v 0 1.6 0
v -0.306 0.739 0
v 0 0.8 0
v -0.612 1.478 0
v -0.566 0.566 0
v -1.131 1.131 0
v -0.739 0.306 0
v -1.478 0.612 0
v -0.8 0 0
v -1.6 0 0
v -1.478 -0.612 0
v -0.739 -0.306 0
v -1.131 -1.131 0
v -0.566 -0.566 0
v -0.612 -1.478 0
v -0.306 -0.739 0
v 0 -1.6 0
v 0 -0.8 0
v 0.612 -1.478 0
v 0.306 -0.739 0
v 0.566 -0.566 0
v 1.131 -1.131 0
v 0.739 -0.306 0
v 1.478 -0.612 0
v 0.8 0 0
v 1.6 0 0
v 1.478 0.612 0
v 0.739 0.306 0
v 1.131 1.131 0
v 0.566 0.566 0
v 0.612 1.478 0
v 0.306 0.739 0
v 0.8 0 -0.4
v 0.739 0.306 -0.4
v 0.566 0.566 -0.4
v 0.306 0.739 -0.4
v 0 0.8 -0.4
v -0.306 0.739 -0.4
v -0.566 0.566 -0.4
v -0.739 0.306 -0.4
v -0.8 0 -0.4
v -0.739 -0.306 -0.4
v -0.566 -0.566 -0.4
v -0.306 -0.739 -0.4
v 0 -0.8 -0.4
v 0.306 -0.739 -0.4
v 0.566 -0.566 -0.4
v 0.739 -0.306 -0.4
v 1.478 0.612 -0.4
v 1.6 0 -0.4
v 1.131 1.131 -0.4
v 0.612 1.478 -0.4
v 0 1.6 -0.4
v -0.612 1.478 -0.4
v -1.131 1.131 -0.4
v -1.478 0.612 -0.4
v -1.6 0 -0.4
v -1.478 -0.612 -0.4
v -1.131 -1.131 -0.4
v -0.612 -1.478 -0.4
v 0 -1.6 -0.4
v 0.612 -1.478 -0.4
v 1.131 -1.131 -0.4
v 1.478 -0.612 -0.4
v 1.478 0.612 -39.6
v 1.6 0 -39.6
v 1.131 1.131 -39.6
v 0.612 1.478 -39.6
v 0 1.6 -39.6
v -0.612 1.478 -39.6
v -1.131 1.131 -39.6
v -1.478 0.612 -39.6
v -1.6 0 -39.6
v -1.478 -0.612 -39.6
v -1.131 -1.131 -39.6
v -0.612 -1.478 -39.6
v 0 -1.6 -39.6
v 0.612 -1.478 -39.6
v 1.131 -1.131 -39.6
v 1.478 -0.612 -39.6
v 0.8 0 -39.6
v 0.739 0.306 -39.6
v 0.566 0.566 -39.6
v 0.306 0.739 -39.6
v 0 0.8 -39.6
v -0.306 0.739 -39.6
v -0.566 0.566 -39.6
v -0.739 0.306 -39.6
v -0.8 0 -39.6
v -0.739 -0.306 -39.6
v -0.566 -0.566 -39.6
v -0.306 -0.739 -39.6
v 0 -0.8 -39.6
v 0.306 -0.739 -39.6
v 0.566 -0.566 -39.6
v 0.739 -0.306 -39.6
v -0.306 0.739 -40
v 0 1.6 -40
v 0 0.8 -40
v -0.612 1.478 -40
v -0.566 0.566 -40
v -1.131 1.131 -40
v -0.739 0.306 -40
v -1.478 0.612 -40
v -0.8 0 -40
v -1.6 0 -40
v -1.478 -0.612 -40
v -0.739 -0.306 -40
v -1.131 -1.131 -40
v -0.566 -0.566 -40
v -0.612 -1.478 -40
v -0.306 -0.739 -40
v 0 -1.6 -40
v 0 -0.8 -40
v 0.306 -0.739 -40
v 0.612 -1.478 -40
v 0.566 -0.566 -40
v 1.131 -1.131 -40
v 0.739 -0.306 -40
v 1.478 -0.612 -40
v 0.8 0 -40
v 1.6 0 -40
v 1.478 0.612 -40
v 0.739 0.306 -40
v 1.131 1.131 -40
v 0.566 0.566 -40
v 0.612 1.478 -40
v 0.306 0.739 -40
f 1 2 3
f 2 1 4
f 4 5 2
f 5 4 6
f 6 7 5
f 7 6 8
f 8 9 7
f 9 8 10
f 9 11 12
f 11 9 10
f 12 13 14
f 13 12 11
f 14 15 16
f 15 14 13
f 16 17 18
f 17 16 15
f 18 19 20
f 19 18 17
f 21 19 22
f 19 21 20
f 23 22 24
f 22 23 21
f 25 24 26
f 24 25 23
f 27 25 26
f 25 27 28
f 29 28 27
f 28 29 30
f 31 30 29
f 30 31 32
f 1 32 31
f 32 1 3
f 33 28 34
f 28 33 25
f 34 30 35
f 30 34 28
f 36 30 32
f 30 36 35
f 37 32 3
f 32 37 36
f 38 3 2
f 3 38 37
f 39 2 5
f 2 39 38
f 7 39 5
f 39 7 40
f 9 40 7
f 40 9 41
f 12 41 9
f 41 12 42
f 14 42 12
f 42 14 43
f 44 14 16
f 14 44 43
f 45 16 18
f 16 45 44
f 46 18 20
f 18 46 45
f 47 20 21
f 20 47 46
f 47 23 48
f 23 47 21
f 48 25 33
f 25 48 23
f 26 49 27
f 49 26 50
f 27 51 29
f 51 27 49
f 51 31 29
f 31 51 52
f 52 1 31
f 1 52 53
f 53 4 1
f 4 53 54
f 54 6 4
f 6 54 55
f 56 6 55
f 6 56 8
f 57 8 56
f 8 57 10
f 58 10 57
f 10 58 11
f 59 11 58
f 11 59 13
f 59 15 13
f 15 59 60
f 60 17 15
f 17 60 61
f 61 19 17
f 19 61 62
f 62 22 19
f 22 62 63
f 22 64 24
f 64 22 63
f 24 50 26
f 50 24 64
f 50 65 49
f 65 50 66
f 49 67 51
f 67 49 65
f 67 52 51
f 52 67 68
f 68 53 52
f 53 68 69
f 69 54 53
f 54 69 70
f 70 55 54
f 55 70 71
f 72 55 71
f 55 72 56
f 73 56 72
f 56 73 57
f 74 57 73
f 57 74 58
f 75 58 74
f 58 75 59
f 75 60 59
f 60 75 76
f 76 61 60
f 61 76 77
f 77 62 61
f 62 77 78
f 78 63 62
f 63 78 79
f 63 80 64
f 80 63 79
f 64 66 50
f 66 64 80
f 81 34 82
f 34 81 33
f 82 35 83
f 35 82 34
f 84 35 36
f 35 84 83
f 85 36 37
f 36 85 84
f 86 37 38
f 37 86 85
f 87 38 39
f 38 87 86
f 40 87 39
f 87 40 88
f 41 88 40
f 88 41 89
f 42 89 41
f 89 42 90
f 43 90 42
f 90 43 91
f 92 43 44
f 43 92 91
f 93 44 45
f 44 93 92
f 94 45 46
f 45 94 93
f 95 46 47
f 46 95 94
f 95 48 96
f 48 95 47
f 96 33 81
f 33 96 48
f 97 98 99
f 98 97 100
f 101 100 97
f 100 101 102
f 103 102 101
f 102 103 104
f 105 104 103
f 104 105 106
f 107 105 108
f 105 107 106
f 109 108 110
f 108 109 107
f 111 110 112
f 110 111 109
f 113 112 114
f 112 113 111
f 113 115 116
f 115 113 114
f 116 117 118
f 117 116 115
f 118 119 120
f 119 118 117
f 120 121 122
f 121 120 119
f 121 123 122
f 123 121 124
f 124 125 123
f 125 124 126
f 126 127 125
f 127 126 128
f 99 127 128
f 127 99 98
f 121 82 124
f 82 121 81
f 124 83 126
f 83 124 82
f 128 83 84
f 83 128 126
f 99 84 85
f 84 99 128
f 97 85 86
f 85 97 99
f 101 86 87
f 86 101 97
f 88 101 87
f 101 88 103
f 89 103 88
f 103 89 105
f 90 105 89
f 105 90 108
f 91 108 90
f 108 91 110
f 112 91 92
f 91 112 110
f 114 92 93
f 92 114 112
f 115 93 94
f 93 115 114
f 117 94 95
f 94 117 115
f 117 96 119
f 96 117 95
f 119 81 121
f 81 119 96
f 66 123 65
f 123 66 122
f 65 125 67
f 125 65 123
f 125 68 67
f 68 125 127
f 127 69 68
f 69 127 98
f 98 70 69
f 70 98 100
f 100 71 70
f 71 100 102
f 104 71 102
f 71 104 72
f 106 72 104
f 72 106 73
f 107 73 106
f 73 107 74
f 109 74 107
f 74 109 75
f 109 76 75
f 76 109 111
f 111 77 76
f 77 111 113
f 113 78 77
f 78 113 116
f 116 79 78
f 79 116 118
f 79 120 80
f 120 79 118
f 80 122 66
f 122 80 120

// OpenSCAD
// file: ../p/4-4disc.scad
use <../lib.scad>
$fa=1; $fs=0.2;
function ldraw_lib__4_4disc(realsolid=false) = [
// 0 Disc 1.0
// 0 Name: 4-4disc.dat
// 0 Author: James Jessiman
// 0 !LDRAW_ORG Primitive UPDATE 2002-02
// 0 !LICENSE Licensed under CC BY 2.0 and CC BY 4.0 : see CAreadme.txt
// 
// 0 BFC CERTIFY CCW
  [0,"BFC","CERTIFY"],
  [0,"BFC","CCW"],
// 
// 0 !HISTORY 1998-12-15 [PTadmin] Official Update 1998-10
// 0 !HISTORY 2002-03-23 [sbliss] Added BFC statement
// 0 !HISTORY 2002-04-25 [PTadmin] Official Update 2002-02
// 0 !HISTORY 2007-06-24 [PTadmin] Header formatted for Contributor Agreement
// 0 !HISTORY 2008-07-01 [PTadmin] Official Update 2008-01
// 
// 
// 3 16 0 0 0 1 0 0 0.9239 0 0.3827
  [3,16,0,0,0,1,0,0,0.9239,0,0.3827],
// 3 16 0 0 0 0.9239 0 0.3827 0.7071 0 0.7071
  [3,16,0,0,0,0.9239,0,0.3827,0.7071,0,0.7071],
// 3 16 0 0 0 0.7071 0 0.7071 0.3827 0 0.9239
  [3,16,0,0,0,0.7071,0,0.7071,0.3827,0,0.9239],
// 3 16 0 0 0 0.3827 0 0.9239 0 0 1
  [3,16,0,0,0,0.3827,0,0.9239,0,0,1],
// 3 16 0 0 0 0 0 1 -0.3827 0 0.9239
  [3,16,0,0,0,0,0,1,-0.3827,0,0.9239],
// 3 16 0 0 0 -0.3827 0 0.9239 -0.7071 0 0.7071
  [3,16,0,0,0,-0.3827,0,0.9239,-0.7071,0,0.7071],
// 3 16 0 0 0 -0.7071 0 0.7071 -0.9239 0 0.3827
  [3,16,0,0,0,-0.7071,0,0.7071,-0.9239,0,0.3827],
// 3 16 0 0 0 -0.9239 0 0.3827 -1 0 -0
  [3,16,0,0,0,-0.9239,0,0.3827,-1,0,-0],
// 3 16 0 0 0 -1 0 -0 -0.9239 0 -0.3827
  [3,16,0,0,0,-1,0,-0,-0.9239,0,-0.3827],
// 3 16 0 0 0 -0.9239 0 -0.3827 -0.7071 0 -0.7071
  [3,16,0,0,0,-0.9239,0,-0.3827,-0.7071,0,-0.7071],
// 3 16 0 0 0 -0.7071 0 -0.7071 -0.3827 0 -0.9239
  [3,16,0,0,0,-0.7071,0,-0.7071,-0.3827,0,-0.9239],
// 3 16 0 0 0 -0.3827 0 -0.9239 0 0 -1
  [3,16,0,0,0,-0.3827,0,-0.9239,0,0,-1],
// 3 16 0 0 0 0 0 -1 0.3827 0 -0.9239
  [3,16,0,0,0,0,0,-1,0.3827,0,-0.9239],
// 3 16 0 0 0 0.3827 0 -0.9239 0.7071 0 -0.7071
  [3,16,0,0,0,0.3827,0,-0.9239,0.7071,0,-0.7071],
// 3 16 0 0 0 0.7071 0 -0.7071 0.9239 0 -0.3827
  [3,16,0,0,0,0.7071,0,-0.7071,0.9239,0,-0.3827],
// 3 16 0 0 0 0.9239 0 -0.3827 1 0 0
  [3,16,0,0,0,0.9239,0,-0.3827,1,0,0],
// 0
];
module ldraw_lib__4_4disc(step=0, col=false, unit=2/5, alt=false, line=0.2, solid=!$preview)
    makepoly(ldraw_lib__4_4disc(solid), step=step, col=col, unit=unit, alt=alt, line=line, solid=solid);
ldraw_lib__4_4disc(line=0.2);
// file: ../p/stud3.scad
use <../lib.scad>
use <4-4cyli.scad>
use <4-4disc.scad>
use <4-4edge.scad>
$fa=1; $fs=0.2;
function ldraw_lib__stud3(realsolid=false) = realsolid ? 
    [openscad(translate([0,0,-eps()], o=cylinder(4+eps(), r=4)),2)] : [
// 0 Stud Tube Solid
// 0 Name: stud3.dat
// 0 Author: James Jessiman
// 0 !LDRAW_ORG Primitive UPDATE 2012-01
// 0 !LICENSE Licensed under CC BY 2.0 and CC BY 4.0 : see CAreadme.txt
// 
// 0 BFC CERTIFY CCW
  [0,"BFC","CERTIFY"],
  [0,"BFC","CCW"],
// 
// 0 !HISTORY 2002-04-04 [sbliss] Modified for BFC compliance
// 0 !HISTORY 2002-04-25 [PTadmin] Official Update 2002-02
// 0 !HISTORY 2007-06-24 [PTadmin] Header formatted for Contributor Agreement
// 0 !HISTORY 2008-07-01 [PTadmin] Official Update 2008-01
// 0 !HISTORY 2012-02-16 [Philo] Changed to CCW
// 0 !HISTORY 2012-03-30 [PTadmin] Official Update 2012-01
// 
// 
// 1 16 0 -4 0 4 0 0 0 1 0 0 0 4 4-4edge.dat
  [1,16,0,-4,0,4,0,0,0,1,0,0,0,4, ldraw_lib__4_4edge(realsolid)],
// 1 16 0 0 0 4 0 0 0 1 0 0 0 4 4-4edge.dat
  [1,16,0,0,0,4,0,0,0,1,0,0,0,4, ldraw_lib__4_4edge(realsolid)],
// 1 16 0 -4 0 4 0 0 0 1 0 0 0 4 4-4disc.dat
  [1,16,0,-4,0,4,0,0,0,1,0,0,0,4, ldraw_lib__4_4disc(realsolid)],
// 1 16 0 -4 0 4 0 0 0 4 0 0 0 4 4-4cyli.dat
  [1,16,0,-4,0,4,0,0,0,4,0,0,0,4, ldraw_lib__4_4cyli(realsolid)],
];
module ldraw_lib__stud3(step=0, col=false, unit=2/5, alt=false, line=0.2, solid=!$preview)
    makepoly(ldraw_lib__stud3(solid), step=step, col=col, unit=unit, alt=alt, line=line, solid=solid);
ldraw_lib__stud3(line=0.2);
// file: ../p/stud.scad
use <../lib.scad>
use <4-4cyli.scad>
use <4-4disc.scad>
use <4-4edge.scad>
$fa=1; $fs=0.2;
function ldraw_lib__stud(realsolid=false) = realsolid ? 
    [openscad(translate([0,0,-eps()], o=cylinder(4+eps(), r=6)),2)] : [
// 0 Stud
// 0 Name: stud.dat
// 0 Author: James Jessiman
// 0 !LDRAW_ORG Primitive UPDATE 2012-01
// 0 !LICENSE Licensed under CC BY 2.0 and CC BY 4.0 : see CAreadme.txt
// 
// 0 BFC CERTIFY CCW
  [0,"BFC","CERTIFY"],
  [0,"BFC","CCW"],
// 
// 0 !HISTORY 2002-04-04 [sbliss] Modified for BFC compliance
// 0 !HISTORY 2002-04-25 [PTadmin] Official Update 2002-02
// 0 !HISTORY 2007-06-24 [PTadmin] Header formatted for Contributor Agreement
// 0 !HISTORY 2008-07-01 [PTadmin] Official Update 2008-01
// 0 !HISTORY 2012-02-16 [Philo] Changed to CCW
// 0 !HISTORY 2012-03-30 [PTadmin] Official Update 2012-01
// 
// 
// 1 16 0 0 0 6 0 0 0 1 0 0 0 6 4-4edge.dat
  [1,16,0,0,0,6,0,0,0,1,0,0,0,6, ldraw_lib__4_4edge(realsolid)],
// 1 16 0 -4 0 6 0 0 0 1 0 0 0 6 4-4edge.dat
  [1,16,0,-4,0,6,0,0,0,1,0,0,0,6, ldraw_lib__4_4edge(realsolid)],
// 1 16 0 0 0 6 0 0 0 -4 0 0 0 6 4-4cyli.dat
  [1,16,0,0,0,6,0,0,0,-4,0,0,0,6, ldraw_lib__4_4cyli(realsolid)],
// 1 16 0 -4 0 6 0 0 0 1 0 0 0 6 4-4disc.dat
  [1,16,0,-4,0,6,0,0,0,1,0,0,0,6, ldraw_lib__4_4disc(realsolid)],
];
module ldraw_lib__stud(step=0, col=false, unit=2/5, alt=false, line=0.2, solid=!$preview)
    makepoly(ldraw_lib__stud(solid), step=step, col=col, unit=unit, alt=alt, line=line, solid=solid);
ldraw_lib__stud(line=0.2);
// file: ../p/box5.scad
use <../lib.scad>
$fa=1; $fs=0.2;
function ldraw_lib__box5(realsolid=false) = [
// 0 Box with 5 Faces and All Edges
// 0 Name: box5.dat
// 0 Author: James Jessiman
// 0 !LDRAW_ORG Primitive UPDATE 2012-01
// 0 !LICENSE Licensed under CC BY 2.0 and CC BY 4.0 : see CAreadme.txt
// 
// 0 BFC CERTIFY CCW
  [0,"BFC","CERTIFY"],
  [0,"BFC","CCW"],
// 
// 0 !HISTORY 2002-04-03 [sbliss] Modified for BFC compliance
// 0 !HISTORY 2002-04-25 [PTadmin] Official Update 2002-02
// 0 !HISTORY 2007-06-24 [PTadmin] Header formatted for Contributor Agreement
// 0 !HISTORY 2008-07-01 [PTadmin] Official Update 2008-01
// 0 !HISTORY 2012-02-16 [Philo] Changed to CCW
// 0 !HISTORY 2012-03-30 [PTadmin] Official Update 2012-01
// 
// 
// 2 24 1 1 1 -1 1 1
  [2,24,1,1,1,-1,1,1],
// 2 24 -1 1 1 -1 1 -1
  [2,24,-1,1,1,-1,1,-1],
// 2 24 -1 1 -1 1 1 -1
  [2,24,-1,1,-1,1,1,-1],
// 2 24 1 1 -1 1 1 1
  [2,24,1,1,-1,1,1,1],
// 2 24 1 0 1 -1 0 1
  [2,24,1,0,1,-1,0,1],
// 2 24 -1 0 1 -1 0 -1
  [2,24,-1,0,1,-1,0,-1],
// 2 24 -1 0 -1 1 0 -1
  [2,24,-1,0,-1,1,0,-1],
// 2 24 1 0 -1 1 0 1
  [2,24,1,0,-1,1,0,1],
// 2 24 1 0 1 1 1 1
  [2,24,1,0,1,1,1,1],
// 2 24 -1 0 1 -1 1 1
  [2,24,-1,0,1,-1,1,1],
// 2 24 1 0 -1 1 1 -1
  [2,24,1,0,-1,1,1,-1],
// 2 24 -1 0 -1 -1 1 -1
  [2,24,-1,0,-1,-1,1,-1],
// 4 16 -1 1 1 1 1 1 1 1 -1 -1 1 -1
  [4,16,-1,1,1,1,1,1,1,1,-1,-1,1,-1],
// 4 16 -1 1 1 -1 0 1 1 0 1 1 1 1
  [4,16,-1,1,1,-1,0,1,1,0,1,1,1,1],
// 4 16 -1 1 -1 -1 0 -1 -1 0 1 -1 1 1
  [4,16,-1,1,-1,-1,0,-1,-1,0,1,-1,1,1],
// 4 16 1 1 -1 1 0 -1 -1 0 -1 -1 1 -1
  [4,16,1,1,-1,1,0,-1,-1,0,-1,-1,1,-1],
// 4 16 1 1 1 1 0 1 1 0 -1 1 1 -1
  [4,16,1,1,1,1,0,1,1,0,-1,1,1,-1],
];
module ldraw_lib__box5(step=0, col=false, unit=2/5, alt=false, line=0.2, solid=!$preview)
    makepoly(ldraw_lib__box5(solid), step=step, col=col, unit=unit, alt=alt, line=line, solid=solid);
ldraw_lib__box5(line=0.2);
// file: ../p/box4t.scad
use <../lib.scad>
$fa=1; $fs=0.2;
function ldraw_lib__box4t(realsolid=false) = [
// 0 Box with 4 Adjacent Faces and All Edges
// 0 Name: box4t.dat
// 0 Author: Tore Eriksson [Tore_Eriksson]
// 0 !LDRAW_ORG Primitive UPDATE 2003-02
// 0 !LICENSE Licensed under CC BY 2.0 and CC BY 4.0 : see CAreadme.txt
// 
// 0 BFC CERTIFY CCW
  [0,"BFC","CERTIFY"],
  [0,"BFC","CCW"],
// 
// 0 !HISTORY 1997-09-29 [PTadmin] Official Update 1997-15
// 0 !HISTORY 2002-08-31 [izanette] Modified with WINDZ for BFC compliance
// 0 !HISTORY 2003-08-01 [PTadmin] Official Update 2003-02
// 0 !HISTORY 2007-06-24 [PTadmin] Header formatted for Contributor Agreement
// 0 !HISTORY 2008-07-01 [PTadmin] Official Update 2008-01
// 
// 
// 2 24 1 1 1 -1 1 1
  [2,24,1,1,1,-1,1,1],
// 2 24 -1 1 1 -1 1 -1
  [2,24,-1,1,1,-1,1,-1],
// 2 24 -1 1 -1 1 1 -1
  [2,24,-1,1,-1,1,1,-1],
// 2 24 1 1 -1 1 1 1
  [2,24,1,1,-1,1,1,1],
// 2 24 1 0 1 -1 0 1
  [2,24,1,0,1,-1,0,1],
// 2 24 -1 0 1 -1 0 -1
  [2,24,-1,0,1,-1,0,-1],
// 2 24 -1 0 -1 1 0 -1
  [2,24,-1,0,-1,1,0,-1],
// 2 24 1 0 -1 1 0 1
  [2,24,1,0,-1,1,0,1],
// 2 24 1 0 1 1 1 1
  [2,24,1,0,1,1,1,1],
// 2 24 -1 0 1 -1 1 1
  [2,24,-1,0,1,-1,1,1],
// 2 24 1 0 -1 1 1 -1
  [2,24,1,0,-1,1,1,-1],
// 2 24 -1 0 -1 -1 1 -1
  [2,24,-1,0,-1,-1,1,-1],
// 4 16 1 1 1 1 1 -1 -1 1 -1 -1 1 1
  [4,16,1,1,1,1,1,-1,-1,1,-1,-1,1,1],
// 4 16 1 1 1 -1 1 1 -1 0 1 1 0 1
  [4,16,1,1,1,-1,1,1,-1,0,1,1,0,1],
// 4 16 -1 1 1 -1 1 -1 -1 0 -1 -1 0 1
  [4,16,-1,1,1,-1,1,-1,-1,0,-1,-1,0,1],
// 0 4 16 -1 1 -1 -1 0 -1 1 0 -1 1 1 -1
// 4 16 1 1 -1 1 1 1 1 0 1 1 0 -1
  [4,16,1,1,-1,1,1,1,1,0,1,1,0,-1],
// 0
];
module ldraw_lib__box4t(step=0, col=false, unit=2/5, alt=false, line=0.2, solid=!$preview)
    makepoly(ldraw_lib__box4t(solid), step=step, col=col, unit=unit, alt=alt, line=line, solid=solid);
ldraw_lib__box4t(line=0.2);
// file: s/3004s01.scad
use <../../lib.scad>
use <../../p/box4t.scad>
use <../../p/box5.scad>
use <../../p/stud.scad>
use <../../p/stud3.scad>
$fa=1; $fs=0.2;
function ldraw_lib__s__3004s01(realsolid=false) = [
// 0 ~Brick  1 x  2 without Front Face
// 0 Name: s\3004s01.dat
// 0 Author: James Jessiman
// 0 !LDRAW_ORG Subpart UPDATE 2003-03
// 0 !LICENSE Licensed under CC BY 2.0 and CC BY 4.0 : see CAreadme.txt
// 
// 0 BFC CERTIFY CCW
  [0,"BFC","CERTIFY"],
  [0,"BFC","CCW"],
// 
// 0 !HISTORY 2003-09-07 [jriley] Subfiling, BFC
// 0 !HISTORY 2003-12-19 [PTadmin] Official Update 2003-03
// 0 !HISTORY 2007-08-29 [PTadmin] Header formatted for Contributor Agreement
// 0 !HISTORY 2008-07-01 [PTadmin] Official Update 2008-01
// 
// 
// 1 16 0 4 0 1 0 0 0 -5 0 0 0 1 stud3.dat
  [1,16,0,4,0,1,0,0,0,-5,0,0,0,1, ldraw_lib__stud3(realsolid)],
// 0 BFC INVERTNEXT
  [0,"BFC","INVERTNEXT"],
// 1 16 0 24 0 16 0 0 0 -20 0 0 0 6 box5.dat
  [1,16,0,24,0,16,0,0,0,-20,0,0,0,6, ldraw_lib__box5(realsolid)],
// 4 16 20 24 10 16 24 6 -16 24 6 -20 24 10
  [4,16,20,24,10,16,24,6,-16,24,6,-20,24,10],
// 4 16 -20 24 10 -16 24 6 -16 24 -6 -20 24 -10
  [4,16,-20,24,10,-16,24,6,-16,24,-6,-20,24,-10],
// 4 16 -20 24 -10 -16 24 -6 16 24 -6 20 24 -10
  [4,16,-20,24,-10,-16,24,-6,16,24,-6,20,24,-10],
// 4 16 20 24 -10 16 24 -6 16 24 6 20 24 10
  [4,16,20,24,-10,16,24,-6,16,24,6,20,24,10],
// 1 16 0 24 0 20 0 0 0 -24 0 0 0 10 box4t.dat
  [1,16,0,24,0,20,0,0,0,-24,0,0,0,10, ldraw_lib__box4t(realsolid)],
// 1 16 10 0 0 1 0 0 0 1 0 0 0 1 stud.dat
  [1,16,10,0,0,1,0,0,0,1,0,0,0,1, ldraw_lib__stud(realsolid)],
// 1 16 -10 0 0 1 0 0 0 1 0 0 0 1 stud.dat
  [1,16,-10,0,0,1,0,0,0,1,0,0,0,1, ldraw_lib__stud(realsolid)],
// 0
];
module ldraw_lib__s__3004s01(step=0, col=false, unit=2/5, alt=false, line=0.2, solid=!$preview)
    makepoly(ldraw_lib__s__3004s01(solid), step=step, col=col, unit=unit, alt=alt, line=line, solid=solid);
ldraw_lib__s__3004s01(line=0.2);
// file: ../p/4-4ring1.scad
use <../lib.scad>
$fa=1; $fs=0.2;
function ldraw_lib__4_4ring1(realsolid=false) = [
// 0 Ring  1 x 1.0
// 0 Name: 4-4ring1.dat
// 0 Author: James Jessiman
// 0 !LDRAW_ORG Primitive UPDATE 2009-01
// 0 !LICENSE Licensed under CC BY 2.0 and CC BY 4.0 : see CAreadme.txt
// 
// 0 BFC CERTIFY CCW
  [0,"BFC","CERTIFY"],
  [0,"BFC","CCW"],
// 
// 0 !HISTORY 1998-12-15 [PTadmin] Official Update 1998-10
// 0 !HISTORY 2002-04-08 [BrickCaster] Modified for BFC compliance
// 0 !HISTORY 2002-04-25 [PTadmin] Official Update 2002-02
// 0 !HISTORY 2007-06-24 [PTadmin] Header formatted for Contributor Agreement
// 0 !HISTORY 2008-07-01 [PTadmin] Official Update 2008-01
// 0 !HISTORY 2008-08-26 [cwdee] Switch polygon winding and rename
// 0 !HISTORY 2009-05-02 [PTadmin] Official Update 2009-01
// 
// 
// 4 16 -0.7654 0 1.8478 -0.3827 0 0.9239 0 0 1 0 0 2
  [4,16,-0.7654,0,1.8478,-0.3827,0,0.9239,0,0,1,0,0,2],
// 4 16 -1.4142 0 1.4142 -0.7071 0 0.7071 -0.3827 0 0.9239 -0.7654 0 1.8478
  [4,16,-1.4142,0,1.4142,-0.7071,0,0.7071,-0.3827,0,0.9239,-0.7654,0,1.8478],
// 4 16 -1.8478 0 0.7654 -0.9239 0 0.3827 -0.7071 0 0.7071 -1.4142 0 1.41420
  [4,16,-1.8478,0,0.7654,-0.9239,0,0.3827,-0.7071,0,0.7071,-1.4142,0,1.41420],
// 4 16 -2 0 0 -1 0 0 -0.9239 0 0.3827 -1.8478 0 0.7654
  [4,16,-2,0,0,-1,0,0,-0.9239,0,0.3827,-1.8478,0,0.7654],
// 4 16 -1.8478 0 -0.7654 -0.9239 0 -0.3827 -1 0 0 -2 0 0
  [4,16,-1.8478,0,-0.7654,-0.9239,0,-0.3827,-1,0,0,-2,0,0],
// 4 16 -1.4142 0 -1.4142 -0.7071 0 -0.7071 -0.9239 0 -0.3827 -1.8478 0 -0.7654
  [4,16,-1.4142,0,-1.4142,-0.7071,0,-0.7071,-0.9239,0,-0.3827,-1.8478,0,-0.7654],
// 4 16 -0.7654 0 -1.8478 -0.3827 0 -0.9239 -0.7071 0 -0.7071 -1.4142 0 -1.4142
  [4,16,-0.7654,0,-1.8478,-0.3827,0,-0.9239,-0.7071,0,-0.7071,-1.4142,0,-1.4142],
// 4 16 0 0 -2 0 0 -1 -0.3827 0 -0.9239 -0.7654 0 -1.8478
  [4,16,0,0,-2,0,0,-1,-0.3827,0,-0.9239,-0.7654,0,-1.8478],
// 4 16 0.7654 0 -1.8478 0.3827 0 -0.9239 0 0 -1 0 0 -2
  [4,16,0.7654,0,-1.8478,0.3827,0,-0.9239,0,0,-1,0,0,-2],
// 4 16 1.4142 0 -1.4142 0.7071 0 -0.7071 0.3827 0 -0.9239 0.7654 0 -1.8478
  [4,16,1.4142,0,-1.4142,0.7071,0,-0.7071,0.3827,0,-0.9239,0.7654,0,-1.8478],
// 4 16 1.8478 0 -0.7654 0.9239 0 -0.3827 0.7071 0 -0.7071 1.4142 0 -1.4142
  [4,16,1.8478,0,-0.7654,0.9239,0,-0.3827,0.7071,0,-0.7071,1.4142,0,-1.4142],
// 4 16 2 0 0 1 0 0 0.9239 0 -0.3827 1.8478 0 -0.7654
  [4,16,2,0,0,1,0,0,0.9239,0,-0.3827,1.8478,0,-0.7654],
// 4 16 1.8478 0 0.7654 0.9239 0 0.3827 1 0 0 2 0 0
  [4,16,1.8478,0,0.7654,0.9239,0,0.3827,1,0,0,2,0,0],
// 4 16 1.4142 0 1.4142 0.7071 0 0.7071 0.9239 0 0.3827 1.8478 0 0.7654
  [4,16,1.4142,0,1.4142,0.7071,0,0.7071,0.9239,0,0.3827,1.8478,0,0.7654],
// 4 16 0.7654 0 1.8478 0.3827 0 0.9239 0.7071 0 0.7071 1.4142 0 1.4142
  [4,16,0.7654,0,1.8478,0.3827,0,0.9239,0.7071,0,0.7071,1.4142,0,1.4142],
// 4 16 0 0 2 0 0 1 0.3827 0 0.9239 0.7654 0 1.8478
  [4,16,0,0,2,0,0,1,0.3827,0,0.9239,0.7654,0,1.8478],
// 0
];
module ldraw_lib__4_4ring1(step=0, col=false, unit=2/5, alt=false, line=0.2, solid=!$preview)
    makepoly(ldraw_lib__4_4ring1(solid), step=step, col=col, unit=unit, alt=alt, line=line, solid=solid);
ldraw_lib__4_4ring1(line=0.2);
// file: ../p/4-4edge.scad
use <../lib.scad>
$fa=1; $fs=0.2;
function ldraw_lib__4_4edge(realsolid=false) = [
// 0 Circle 1.0
// 0 Name: 4-4edge.dat
// 0 Author: James Jessiman
// 0 !LDRAW_ORG Primitive UPDATE 2017-01
// 0 !LICENSE Licensed under CC BY 2.0 and CC BY 4.0 : see CAreadme.txt
// 
// 0 BFC CERTIFY CCW
  [0,"BFC","CERTIFY"],
  [0,"BFC","CCW"],
// 
// 0 !HISTORY 1998-12-15 [PTadmin] Official Update 1998-10
// 0 !HISTORY 2005-12-28 [PTadmin] Official Update 2005-01
// 0 !HISTORY 2007-06-24 [PTadmin] Header formatted for Contributor Agreement
// 0 !HISTORY 2008-07-01 [PTadmin] Official Update 2008-01
// 0 !HISTORY 2017-01-15 [Steffen] BFCed
// 0 !HISTORY 2017-12-30 [PTadmin] Official Update 2017-01
// 
// 
// 2 24 1 0 0 0.9239 0 0.3827
  [2,24,1,0,0,0.9239,0,0.3827],
// 2 24 0.9239 0 0.3827 0.7071 0 0.7071
  [2,24,0.9239,0,0.3827,0.7071,0,0.7071],
// 2 24 0.7071 0 0.7071 0.3827 0 0.9239
  [2,24,0.7071,0,0.7071,0.3827,0,0.9239],
// 2 24 0.3827 0 0.9239 0 0 1
  [2,24,0.3827,0,0.9239,0,0,1],
// 2 24 0 0 1 -0.3827 0 0.9239
  [2,24,0,0,1,-0.3827,0,0.9239],
// 2 24 -0.3827 0 0.9239 -0.7071 0 0.7071
  [2,24,-0.3827,0,0.9239,-0.7071,0,0.7071],
// 2 24 -0.7071 0 0.7071 -0.9239 0 0.3827
  [2,24,-0.7071,0,0.7071,-0.9239,0,0.3827],
// 2 24 -0.9239 0 0.3827 -1 0 -0
  [2,24,-0.9239,0,0.3827,-1,0,-0],
// 2 24 -1 0 -0 -0.9239 0 -0.3827
  [2,24,-1,0,-0,-0.9239,0,-0.3827],
// 2 24 -0.9239 0 -0.3827 -0.7071 0 -0.7071
  [2,24,-0.9239,0,-0.3827,-0.7071,0,-0.7071],
// 2 24 -0.7071 0 -0.7071 -0.3827 0 -0.9239
  [2,24,-0.7071,0,-0.7071,-0.3827,0,-0.9239],
// 2 24 -0.3827 0 -0.9239 0 0 -1
  [2,24,-0.3827,0,-0.9239,0,0,-1],
// 2 24 0 0 -1 0.3827 0 -0.9239
  [2,24,0,0,-1,0.3827,0,-0.9239],
// 2 24 0.3827 0 -0.9239 0.7071 0 -0.7071
  [2,24,0.3827,0,-0.9239,0.7071,0,-0.7071],
// 2 24 0.7071 0 -0.7071 0.9239 0 -0.3827
  [2,24,0.7071,0,-0.7071,0.9239,0,-0.3827],
// 2 24 0.9239 0 -0.3827 1 0 0
  [2,24,0.9239,0,-0.3827,1,0,0],
];
module ldraw_lib__4_4edge(step=0, col=false, unit=2/5, alt=false, line=0.2, solid=!$preview)
    makepoly(ldraw_lib__4_4edge(solid), step=step, col=col, unit=unit, alt=alt, line=line, solid=solid);
ldraw_lib__4_4edge(line=0.2);
// file: ../p/4-4cyli.scad
use <../lib.scad>
$fa=1; $fs=0.2;
function ldraw_lib__4_4cyli(realsolid=false) = [
// 0 Cylinder 1.0
// 0 Name: 4-4cyli.dat
// 0 Author: James Jessiman
// 0 !LDRAW_ORG Primitive UPDATE 2005-01
// 0 !LICENSE Licensed under CC BY 2.0 and CC BY 4.0 : see CAreadme.txt
// 
// 0 BFC CERTIFY CCW
  [0,"BFC","CERTIFY"],
  [0,"BFC","CCW"],
// 
// 0 !HISTORY 1998-12-15 [PTadmin] Official Update 1998-10
// 0 !HISTORY 2002-03-23 [sbliss] Added BFC statement; merged headers from files in distributions LDraw 0.27 and Complete.
// 0 !HISTORY 2002-04-25 [PTadmin] Official Update 2002-02
// 0 !HISTORY 2004-12-14 [guyvivan] BFC CCW
// 0 !HISTORY 2005-12-28 [PTadmin] Official Update 2005-01
// 0 !HISTORY 2007-06-24 [PTadmin] Header formatted for Contributor Agreement
// 0 !HISTORY 2008-07-01 [PTadmin] Official Update 2008-01
// 
// 
// 4 16 1 1 0 0.9239 1 0.3827 0.9239 0 0.3827 1 0 0
  [4,16,1,1,0,0.9239,1,0.3827,0.9239,0,0.3827,1,0,0],
// 5 24 1 0 0 1 1 0 0.9239 0 0.3827 0.9239 0 -0.3827
  [5,24,1,0,0,1,1,0,0.9239,0,0.3827,0.9239,0,-0.3827],
// 4 16 0.9239 1 0.3827 0.7071 1 0.7071 0.7071 0 0.7071 0.9239 0 0.3827
  [4,16,0.9239,1,0.3827,0.7071,1,0.7071,0.7071,0,0.7071,0.9239,0,0.3827],
// 5 24 0.9239 0 0.3827 0.9239 1 0.3827 0.7071 0 0.7071 1 0 0
  [5,24,0.9239,0,0.3827,0.9239,1,0.3827,0.7071,0,0.7071,1,0,0],
// 4 16 0.7071 1 0.7071 0.3827 1 0.9239 0.3827 0 0.9239 0.7071 0 0.7071
  [4,16,0.7071,1,0.7071,0.3827,1,0.9239,0.3827,0,0.9239,0.7071,0,0.7071],
// 5 24 0.7071 0 0.7071 0.7071 1 0.7071 0.3827 0 0.9239 0.9239 0 0.3827
  [5,24,0.7071,0,0.7071,0.7071,1,0.7071,0.3827,0,0.9239,0.9239,0,0.3827],
// 4 16 0.3827 1 0.9239 0 1 1 0 0 1 0.3827 0 0.9239
  [4,16,0.3827,1,0.9239,0,1,1,0,0,1,0.3827,0,0.9239],
// 5 24 0.3827 0 0.9239 0.3827 1 0.9239 0 0 1 0.7071 0 0.7071
  [5,24,0.3827,0,0.9239,0.3827,1,0.9239,0,0,1,0.7071,0,0.7071],
// 4 16 0 1 1 -0.3827 1 0.9239 -0.3827 0 0.9239 0 0 1
  [4,16,0,1,1,-0.3827,1,0.9239,-0.3827,0,0.9239,0,0,1],
// 5 24 0 0 1 0 1 1 -0.3827 0 0.9239 0.3827 0 0.9239
  [5,24,0,0,1,0,1,1,-0.3827,0,0.9239,0.3827,0,0.9239],
// 4 16 -0.3827 1 0.9239 -0.7071 1 0.7071 -0.7071 0 0.7071 -0.3827 0 0.9239
  [4,16,-0.3827,1,0.9239,-0.7071,1,0.7071,-0.7071,0,0.7071,-0.3827,0,0.9239],
// 5 24 -0.3827 0 0.9239 -0.3827 1 0.9239 -0.7071 0 0.7071 0 0 1
  [5,24,-0.3827,0,0.9239,-0.3827,1,0.9239,-0.7071,0,0.7071,0,0,1],
// 4 16 -0.7071 1 0.7071 -0.9239 1 0.3827 -0.9239 0 0.3827 -0.7071 0 0.7071
  [4,16,-0.7071,1,0.7071,-0.9239,1,0.3827,-0.9239,0,0.3827,-0.7071,0,0.7071],
// 5 24 -0.7071 0 0.7071 -0.7071 1 0.7071 -0.9239 0 0.3827 -0.3827 0 0.9239
  [5,24,-0.7071,0,0.7071,-0.7071,1,0.7071,-0.9239,0,0.3827,-0.3827,0,0.9239],
// 4 16 -0.9239 1 0.3827 -1 1 0 -1 0 0 -0.9239 0 0.3827
  [4,16,-0.9239,1,0.3827,-1,1,0,-1,0,0,-0.9239,0,0.3827],
// 5 24 -0.9239 0 0.3827 -0.9239 1 0.3827 -1 0 0 -0.7071 0 0.7071
  [5,24,-0.9239,0,0.3827,-0.9239,1,0.3827,-1,0,0,-0.7071,0,0.7071],
// 4 16 -1 1 0 -0.9239 1 -0.3827 -0.9239 0 -0.3827 -1 0 0
  [4,16,-1,1,0,-0.9239,1,-0.3827,-0.9239,0,-0.3827,-1,0,0],
// 5 24 -1 0 0 -1 1 0 -0.9239 0 -0.3827 -0.9239 0 0.3827
  [5,24,-1,0,0,-1,1,0,-0.9239,0,-0.3827,-0.9239,0,0.3827],
// 4 16 -0.9239 1 -0.3827 -0.7071 1 -0.7071 -0.7071 0 -0.7071 -0.9239 0 -0.3827
  [4,16,-0.9239,1,-0.3827,-0.7071,1,-0.7071,-0.7071,0,-0.7071,-0.9239,0,-0.3827],
// 5 24 -0.9239 0 -0.3827 -0.9239 1 -0.3827 -0.7071 0 -0.7071 -1 0 0
  [5,24,-0.9239,0,-0.3827,-0.9239,1,-0.3827,-0.7071,0,-0.7071,-1,0,0],
// 4 16 -0.7071 1 -0.7071 -0.3827 1 -0.9239 -0.3827 0 -0.9239 -0.7071 0 -0.7071
  [4,16,-0.7071,1,-0.7071,-0.3827,1,-0.9239,-0.3827,0,-0.9239,-0.7071,0,-0.7071],
// 5 24 -0.7071 0 -0.7071 -0.7071 1 -0.7071 -0.3827 0 -0.9239 -0.9239 0 -0.3827
  [5,24,-0.7071,0,-0.7071,-0.7071,1,-0.7071,-0.3827,0,-0.9239,-0.9239,0,-0.3827],
// 4 16 -0.3827 1 -0.9239 0 1 -1 0 0 -1 -0.3827 0 -0.9239
  [4,16,-0.3827,1,-0.9239,0,1,-1,0,0,-1,-0.3827,0,-0.9239],
// 5 24 -0.3827 0 -0.9239 -0.3827 1 -0.9239 0 0 -1 -0.7071 0 -0.7071
  [5,24,-0.3827,0,-0.9239,-0.3827,1,-0.9239,0,0,-1,-0.7071,0,-0.7071],
// 4 16 0 1 -1 0.3827 1 -0.9239 0.3827 0 -0.9239 0 0 -1
  [4,16,0,1,-1,0.3827,1,-0.9239,0.3827,0,-0.9239,0,0,-1],
// 5 24 0 0 -1 0 1 -1 0.3827 0 -0.9239 -0.3827 0 -0.9239
  [5,24,0,0,-1,0,1,-1,0.3827,0,-0.9239,-0.3827,0,-0.9239],
// 4 16 0.3827 1 -0.9239 0.7071 1 -0.7071 0.7071 0 -0.7071 0.3827 0 -0.9239
  [4,16,0.3827,1,-0.9239,0.7071,1,-0.7071,0.7071,0,-0.7071,0.3827,0,-0.9239],
// 5 24 0.3827 0 -0.9239 0.3827 1 -0.9239 0.7071 0 -0.7071 0 0 -1
  [5,24,0.3827,0,-0.9239,0.3827,1,-0.9239,0.7071,0,-0.7071,0,0,-1],
// 4 16 0.7071 1 -0.7071 0.9239 1 -0.3827 0.9239 0 -0.3827 0.7071 0 -0.7071
  [4,16,0.7071,1,-0.7071,0.9239,1,-0.3827,0.9239,0,-0.3827,0.7071,0,-0.7071],
// 5 24 0.7071 0 -0.7071 0.7071 1 -0.7071 0.9239 0 -0.3827 0.3827 0 -0.9239
  [5,24,0.7071,0,-0.7071,0.7071,1,-0.7071,0.9239,0,-0.3827,0.3827,0,-0.9239],
// 4 16 0.9239 1 -0.3827 1 1 0 1 0 0 0.9239 0 -0.3827
  [4,16,0.9239,1,-0.3827,1,1,0,1,0,0,0.9239,0,-0.3827],
// 5 24 0.9239 0 -0.3827 0.9239 1 -0.3827 1 0 0 0.7071 0 -0.7071
  [5,24,0.9239,0,-0.3827,0.9239,1,-0.3827,1,0,0,0.7071,0,-0.7071],
// 0
];
module ldraw_lib__4_4cyli(step=0, col=false, unit=2/5, alt=false, line=0.2, solid=!$preview)
    makepoly(ldraw_lib__4_4cyli(solid), step=step, col=col, unit=unit, alt=alt, line=line, solid=solid);
ldraw_lib__4_4cyli(line=0.2);
// file: 3004.scad
use <../lib.scad>
use <s/3004s01.scad>
$fa=1; $fs=0.2;
function ldraw_lib__3004(realsolid=false) = [
// 0 Brick  1 x  2
// 0 Name: 3004.dat
// 0 Author: James Jessiman
// 0 !LDRAW_ORG Part UPDATE 2022-05
// 0 !LICENSE Licensed under CC BY 2.0 and CC BY 4.0 : see CAreadme.txt
// 
// 0 BFC CERTIFY CCW
  [0,"BFC","CERTIFY"],
  [0,"BFC","CCW"],
// 
// 0 !HISTORY 2001-10-26 [PTadmin] Official Update 2001-01
// 0 !HISTORY 2002-05-07 {unknown} BFC Certification
// 0 !HISTORY 2002-06-11 [PTadmin] Official Update 2002-03
// 0 !HISTORY 2007-05-07 [PTadmin] Header formatted for Contributor Agreement
// 0 !HISTORY 2008-07-01 [PTadmin] Official Update 2008-01
// 0 !HISTORY 2022-08-04 [MagFors] Using subfile
// 0 !HISTORY 2022-09-15 [PTadmin] Official Update 2022-05
// 
// 
// 1 16 0 0 0 1 0 0 0 1 0 0 0 1 s\3004s01.dat
  [1,16,0,0,0,1,0,0,0,1,0,0,0,1, ldraw_lib__s__3004s01(realsolid)],
// 4 16 -20 24 -10 20 24 -10 20 0 -10 -20 0 -10
  [4,16,-20,24,-10,20,24,-10,20,0,-10,-20,0,-10],
];
module ldraw_lib__3004(step=0, col=false, unit=2/5, alt=false, line=0.2, solid=!$preview)
    makepoly(ldraw_lib__3004(solid), step=step, col=col, unit=unit, alt=alt, line=line, solid=solid);
ldraw_lib__3004(line=0.2);
// file: u9053.scad
use <../lib.scad>
use <../p/4-4cyli.scad>
use <../p/4-4edge.scad>
use <../p/4-4ring1.scad>
$fa=1; $fs=0.2;
function ldraw_lib__u9053(realsolid=false) = [
// 0 ~Technic Flex-System Hose End
// 0 Name: u9053.dat
// 0 Author: William Howard [WilliamH]
// 0 !LDRAW_ORG Part UPDATE 2011-02
// 0 !LICENSE Licensed under CC BY 2.0 and CC BY 4.0 : see CAreadme.txt
// 
// 0 BFC CERTIFY CCW
  [0,"BFC","CERTIFY"],
  [0,"BFC","CCW"],
// 
// 0 !HISTORY 2011-12-21 [cwdee] Reworked subparting technique
// 0 !HISTORY 2011-12-23 [PTadmin] Renamed from 76
// 0 !HISTORY 2011-12-29 [PTadmin] Official Update 2011-02
// 
// 
// 1 16 0 0 0 2 0 0 0 1 0 0 0 2 4-4ring1.dat
  [1,16,0,0,0,2,0,0,0,1,0,0,0,2, ldraw_lib__4_4ring1(realsolid)],
// 1 16 0 0 0 2 0 0 0 1 0 0 0 2 4-4edge.dat
  [1,16,0,0,0,2,0,0,0,1,0,0,0,2, ldraw_lib__4_4edge(realsolid)],
// 0 BFC INVERTNEXT
  [0,"BFC","INVERTNEXT"],
// 1 16 0 0 0 2 0 0 0 1 0 0 0 2 4-4cyli.dat
  [1,16,0,0,0,2,0,0,0,1,0,0,0,2, ldraw_lib__4_4cyli(realsolid)],
// 1 16 0 0 0 4 0 0 0 1 0 0 0 4 4-4edge.dat
  [1,16,0,0,0,4,0,0,0,1,0,0,0,4, ldraw_lib__4_4edge(realsolid)],
// 1 16 0 0 0 4 0 0 0 1 0 0 0 4 4-4cyli.dat
  [1,16,0,0,0,4,0,0,0,1,0,0,0,4, ldraw_lib__4_4cyli(realsolid)],
// 0
];
module ldraw_lib__u9053(step=0, col=false, unit=2/5, alt=false, line=0.2, solid=!$preview)
    makepoly(ldraw_lib__u9053(solid), step=step, col=col, unit=unit, alt=alt, line=line, solid=solid);
ldraw_lib__u9053(line=0.2);
// file: 77.scad
use <../lib.scad>
use <../p/4-4cyli.scad>
$fa=1; $fs=0.2;
function ldraw_lib__77(realsolid=false) = [
// 0 ~Technic Flex-System Hose Segment
// 0 Name: 77.dat
// 0 Author: William Howard [WilliamH]
// 0 !LDRAW_ORG Part UPDATE 2011-02
// 0 !LICENSE Licensed under CC BY 2.0 and CC BY 4.0 : see CAreadme.txt
// 
// 0 BFC CERTIFY CCW
  [0,"BFC","CERTIFY"],
  [0,"BFC","CCW"],
// 
// 0 !HISTORY 2011-12-21 [cwdee] Reworked subparting technique
// 0 !HISTORY 2011-12-29 [PTadmin] Official Update 2011-02
// 
// 
// 1 16 0 0 0 4 0 0 0 1 0 0 0 4 4-4cyli.dat
  [1,16,0,0,0,4,0,0,0,1,0,0,0,4, ldraw_lib__4_4cyli(realsolid)],
// 0 BFC INVERTNEXT
  [0,"BFC","INVERTNEXT"],
// 1 16 0 0 0 2 0 0 0 1 0 0 0 2 4-4cyli.dat
  [1,16,0,0,0,2,0,0,0,1,0,0,0,2, ldraw_lib__4_4cyli(realsolid)],
// 0
];
module ldraw_lib__77(step=0, col=false, unit=2/5, alt=false, line=0.2, solid=!$preview)
    makepoly(ldraw_lib__77(solid), step=step, col=col, unit=unit, alt=alt, line=line, solid=solid);
ldraw_lib__77(line=0.2);
// main file
use <../lib.scad>
use <77.scad>
use <u9053.scad>
$fa=1; $fs=0.2;
function ldraw_lib__76307(realsolid=false) = [
// 0 Technic Flex-System Hose  5L (100LDU)
// 0 Name: 76307.dat
// 0 Author: Chris Dee [cwdee]
// 0 !LDRAW_ORG Part UPDATE 2011-02
// 0 !LICENSE Licensed under CC BY 2.0 and CC BY 4.0 : see CAreadme.txt
// 
// 0 BFC CERTIFY CCW
  [0,"BFC","CERTIFY"],
  [0,"BFC","CCW"],
// 
// 0 !KEYWORDS bar, tube
// 
// 0 !HISTORY 2011-12-29 [PTadmin] Official Update 2011-02
// 
// 
// 1 16 0 0 0 1 0 0 0 1 0 0 0 1 u9053.dat
  [1,16,0,0,0,1,0,0,0,1,0,0,0,1, ldraw_lib__u9053(realsolid)],
// 1 16 0 1 0 1 0 0 0 98 0 0 0 1 77.dat
  [1,16,0,1,0,1,0,0,0,98,0,0,0,1, ldraw_lib__77(realsolid)],
// 1 16 0 100 0 1 0 0 0 -1 0 0 0 1 u9053.dat
  [1,16,0,100,0,1,0,0,0,-1,0,0,0,1, ldraw_lib__u9053(realsolid)],
];
module ldraw_lib__76307(step=0, col=false, unit=2/5, alt=false, line=0.2, solid=!$preview)
    makepoly(ldraw_lib__76307(solid), step=step, col=col, unit=unit, alt=alt, line=line, solid=solid);
ldraw_lib__76307(line=0.2);
